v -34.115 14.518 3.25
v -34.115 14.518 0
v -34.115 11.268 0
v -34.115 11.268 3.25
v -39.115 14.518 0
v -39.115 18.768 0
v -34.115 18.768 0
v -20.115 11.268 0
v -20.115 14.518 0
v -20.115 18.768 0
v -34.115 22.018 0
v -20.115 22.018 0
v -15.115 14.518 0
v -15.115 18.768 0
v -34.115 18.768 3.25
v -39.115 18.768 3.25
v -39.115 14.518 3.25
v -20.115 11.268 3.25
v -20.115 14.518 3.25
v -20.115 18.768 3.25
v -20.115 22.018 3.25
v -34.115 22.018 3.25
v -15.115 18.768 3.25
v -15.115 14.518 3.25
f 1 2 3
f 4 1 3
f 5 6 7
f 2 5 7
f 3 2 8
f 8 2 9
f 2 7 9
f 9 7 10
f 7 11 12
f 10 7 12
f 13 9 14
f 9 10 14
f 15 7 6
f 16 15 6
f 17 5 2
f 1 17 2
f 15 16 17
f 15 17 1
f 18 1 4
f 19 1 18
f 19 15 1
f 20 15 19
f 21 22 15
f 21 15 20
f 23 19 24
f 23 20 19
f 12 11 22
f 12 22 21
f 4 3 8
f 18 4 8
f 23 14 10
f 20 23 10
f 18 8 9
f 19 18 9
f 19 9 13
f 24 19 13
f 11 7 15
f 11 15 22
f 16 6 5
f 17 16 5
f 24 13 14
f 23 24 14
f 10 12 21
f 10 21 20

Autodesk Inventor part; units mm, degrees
ref_plane "YZ Plane" through (0, 0, 0) normal (1, 0, 0) x (0, 1, 0)
ref_plane "XZ Plane" through (0, 0, 0) normal (0, 1, 0) x (-1, 0, 0)
ref_plane "XY Plane" through (0, 0, 0) normal (0, 0, 1) x (1, 0, 0)
sketch "Block1" plane through (0, 0, 0) normal (0, 0, 1) x (1, 0, 0)
  circle A0 centre (74.029, 24.2723) radius 1
  line L0 (49.279, 30.4723) -> (71.779, 30.4723)
  line L1 (71.779, 30.4723) -> (71.779, 18.0723)
  line L2 (71.779, 18.0723) -> (49.279, 18.0723)
  line L3 (49.279, 18.0723) -> (49.279, 30.4723)
  line L4 (49.279, 30.4723) -> (44.779, 30.4723)
  line L5 (44.779, 30.4723) -> (44.779, 18.0723)
  line L6 (44.779, 18.0723) -> (49.279, 18.0723)
  line L7 (49.279, 18.0723) -> (49.279, 30.4723)
  line L8 (71.779, 30.4723) -> (76.279, 30.4723)
  line L9 (76.279, 30.4723) -> (76.279, 18.0723)
  line L10 (76.279, 18.0723) -> (71.779, 18.0723)
  line L11 (71.779, 18.0723) -> (71.779, 30.4723)
  line L12 (44.779, 24.2723) -> (76.279, 24.2723) construction
  line L13 (47.029, 30.4723) -> (47.029, 18.0723) construction
  circle A1 centre (47.029, 24.2723) radius 1
  line L14 (74.029, 30.4723) -> (74.029, 18.0723) construction
  point P0 (60.979, 24.0984)
  dimension "d22" = 22.5
  dimension "d23" = 12.4
  dimension "d24" = 4.5
  dimension "d25" = 4.5
  dimension "d26" = 2
  dimension "d27" = 2
sketch "Sketch1" plane through (0, 0, 0) normal (0, 0, 1) x (1, 0, 0)
  line L0 (-92.7646, -8.503) -> (-89.7646, -8.503)
  line L1 (-89.7646, -8.503) -> (-89.7646, -11.753)
  line L2 (-89.7646, -11.753) -> (-92.7646, -11.753)
  line L3 (-92.7646, -11.753) -> (-92.7646, -8.503)
  line L4 (-92.7646, -21.6527) -> (-89.7646, -21.6527)
  line L5 (-89.7646, -21.6527) -> (-89.7646, -21.7527)
  line L6 (-89.7646, -21.7527) -> (-92.7646, -21.7527)
  line L7 (-92.7646, -21.7527) -> (-92.7646, -21.6527)
  line L8 (-39.1148, 14.5179) -> (-15.1148, 14.5179)
  line L9 (-15.1148, 14.5179) -> (-15.1148, 18.7679)
  line L10 (-15.1148, 18.7679) -> (-39.1148, 18.7679)
  line L11 (-39.1148, 18.7679) -> (-39.1148, 14.5179)
  line L12 (-34.1148, 22.0179) -> (-20.1148, 22.0179)
  line L13 (-20.1148, 22.0179) -> (-20.1148, 18.7679)
  line L14 (-20.1148, 18.7679) -> (-34.1148, 18.7679)
  line L15 (-34.1148, 18.7679) -> (-34.1148, 22.0179)
  line L16 (-39.1148, 16.6429) -> (-15.1148, 16.6429) construction
  line L17 (-27.1148, 22.0179) -> (-27.1148, 18.7679) construction
  line L18 (-27.1148, 18.7679) -> (-27.1148, 14.5179) construction
  line L19 (-34.1148, 11.2679) -> (-20.1148, 11.2679)
  line L20 (-20.1148, 11.2679) -> (-20.1148, 14.5179)
  line L21 (-20.1148, 14.5179) -> (-34.1148, 14.5179)
  line L22 (-34.1148, 14.5179) -> (-34.1148, 11.2679)
  line L23 (-27.1148, 11.2679) -> (-27.1148, 14.5179) construction
  point P0 (0, 0)
  point P1 (-27.1148, 14.5179)
  dimension "d3" = 3
  dimension "mat" = 3.25
  dimension "d5" = 3
  dimension "kerf" = 0.1
  dimension "d42" = 24
  dimension "d43" = 4.25
  dimension "d44" = 14
  dimension "d45" = 3.25
extrude "Extrusion6" add sketch "Sketch1" along normal blind 3.25 contours L11 L10 L9 L8 | L8 L20 L19 L22 | L15 L12 L13 L10
equation "\"d45\" = mat"
equation "\"d46\" = mat"
properties part number "body-back"
